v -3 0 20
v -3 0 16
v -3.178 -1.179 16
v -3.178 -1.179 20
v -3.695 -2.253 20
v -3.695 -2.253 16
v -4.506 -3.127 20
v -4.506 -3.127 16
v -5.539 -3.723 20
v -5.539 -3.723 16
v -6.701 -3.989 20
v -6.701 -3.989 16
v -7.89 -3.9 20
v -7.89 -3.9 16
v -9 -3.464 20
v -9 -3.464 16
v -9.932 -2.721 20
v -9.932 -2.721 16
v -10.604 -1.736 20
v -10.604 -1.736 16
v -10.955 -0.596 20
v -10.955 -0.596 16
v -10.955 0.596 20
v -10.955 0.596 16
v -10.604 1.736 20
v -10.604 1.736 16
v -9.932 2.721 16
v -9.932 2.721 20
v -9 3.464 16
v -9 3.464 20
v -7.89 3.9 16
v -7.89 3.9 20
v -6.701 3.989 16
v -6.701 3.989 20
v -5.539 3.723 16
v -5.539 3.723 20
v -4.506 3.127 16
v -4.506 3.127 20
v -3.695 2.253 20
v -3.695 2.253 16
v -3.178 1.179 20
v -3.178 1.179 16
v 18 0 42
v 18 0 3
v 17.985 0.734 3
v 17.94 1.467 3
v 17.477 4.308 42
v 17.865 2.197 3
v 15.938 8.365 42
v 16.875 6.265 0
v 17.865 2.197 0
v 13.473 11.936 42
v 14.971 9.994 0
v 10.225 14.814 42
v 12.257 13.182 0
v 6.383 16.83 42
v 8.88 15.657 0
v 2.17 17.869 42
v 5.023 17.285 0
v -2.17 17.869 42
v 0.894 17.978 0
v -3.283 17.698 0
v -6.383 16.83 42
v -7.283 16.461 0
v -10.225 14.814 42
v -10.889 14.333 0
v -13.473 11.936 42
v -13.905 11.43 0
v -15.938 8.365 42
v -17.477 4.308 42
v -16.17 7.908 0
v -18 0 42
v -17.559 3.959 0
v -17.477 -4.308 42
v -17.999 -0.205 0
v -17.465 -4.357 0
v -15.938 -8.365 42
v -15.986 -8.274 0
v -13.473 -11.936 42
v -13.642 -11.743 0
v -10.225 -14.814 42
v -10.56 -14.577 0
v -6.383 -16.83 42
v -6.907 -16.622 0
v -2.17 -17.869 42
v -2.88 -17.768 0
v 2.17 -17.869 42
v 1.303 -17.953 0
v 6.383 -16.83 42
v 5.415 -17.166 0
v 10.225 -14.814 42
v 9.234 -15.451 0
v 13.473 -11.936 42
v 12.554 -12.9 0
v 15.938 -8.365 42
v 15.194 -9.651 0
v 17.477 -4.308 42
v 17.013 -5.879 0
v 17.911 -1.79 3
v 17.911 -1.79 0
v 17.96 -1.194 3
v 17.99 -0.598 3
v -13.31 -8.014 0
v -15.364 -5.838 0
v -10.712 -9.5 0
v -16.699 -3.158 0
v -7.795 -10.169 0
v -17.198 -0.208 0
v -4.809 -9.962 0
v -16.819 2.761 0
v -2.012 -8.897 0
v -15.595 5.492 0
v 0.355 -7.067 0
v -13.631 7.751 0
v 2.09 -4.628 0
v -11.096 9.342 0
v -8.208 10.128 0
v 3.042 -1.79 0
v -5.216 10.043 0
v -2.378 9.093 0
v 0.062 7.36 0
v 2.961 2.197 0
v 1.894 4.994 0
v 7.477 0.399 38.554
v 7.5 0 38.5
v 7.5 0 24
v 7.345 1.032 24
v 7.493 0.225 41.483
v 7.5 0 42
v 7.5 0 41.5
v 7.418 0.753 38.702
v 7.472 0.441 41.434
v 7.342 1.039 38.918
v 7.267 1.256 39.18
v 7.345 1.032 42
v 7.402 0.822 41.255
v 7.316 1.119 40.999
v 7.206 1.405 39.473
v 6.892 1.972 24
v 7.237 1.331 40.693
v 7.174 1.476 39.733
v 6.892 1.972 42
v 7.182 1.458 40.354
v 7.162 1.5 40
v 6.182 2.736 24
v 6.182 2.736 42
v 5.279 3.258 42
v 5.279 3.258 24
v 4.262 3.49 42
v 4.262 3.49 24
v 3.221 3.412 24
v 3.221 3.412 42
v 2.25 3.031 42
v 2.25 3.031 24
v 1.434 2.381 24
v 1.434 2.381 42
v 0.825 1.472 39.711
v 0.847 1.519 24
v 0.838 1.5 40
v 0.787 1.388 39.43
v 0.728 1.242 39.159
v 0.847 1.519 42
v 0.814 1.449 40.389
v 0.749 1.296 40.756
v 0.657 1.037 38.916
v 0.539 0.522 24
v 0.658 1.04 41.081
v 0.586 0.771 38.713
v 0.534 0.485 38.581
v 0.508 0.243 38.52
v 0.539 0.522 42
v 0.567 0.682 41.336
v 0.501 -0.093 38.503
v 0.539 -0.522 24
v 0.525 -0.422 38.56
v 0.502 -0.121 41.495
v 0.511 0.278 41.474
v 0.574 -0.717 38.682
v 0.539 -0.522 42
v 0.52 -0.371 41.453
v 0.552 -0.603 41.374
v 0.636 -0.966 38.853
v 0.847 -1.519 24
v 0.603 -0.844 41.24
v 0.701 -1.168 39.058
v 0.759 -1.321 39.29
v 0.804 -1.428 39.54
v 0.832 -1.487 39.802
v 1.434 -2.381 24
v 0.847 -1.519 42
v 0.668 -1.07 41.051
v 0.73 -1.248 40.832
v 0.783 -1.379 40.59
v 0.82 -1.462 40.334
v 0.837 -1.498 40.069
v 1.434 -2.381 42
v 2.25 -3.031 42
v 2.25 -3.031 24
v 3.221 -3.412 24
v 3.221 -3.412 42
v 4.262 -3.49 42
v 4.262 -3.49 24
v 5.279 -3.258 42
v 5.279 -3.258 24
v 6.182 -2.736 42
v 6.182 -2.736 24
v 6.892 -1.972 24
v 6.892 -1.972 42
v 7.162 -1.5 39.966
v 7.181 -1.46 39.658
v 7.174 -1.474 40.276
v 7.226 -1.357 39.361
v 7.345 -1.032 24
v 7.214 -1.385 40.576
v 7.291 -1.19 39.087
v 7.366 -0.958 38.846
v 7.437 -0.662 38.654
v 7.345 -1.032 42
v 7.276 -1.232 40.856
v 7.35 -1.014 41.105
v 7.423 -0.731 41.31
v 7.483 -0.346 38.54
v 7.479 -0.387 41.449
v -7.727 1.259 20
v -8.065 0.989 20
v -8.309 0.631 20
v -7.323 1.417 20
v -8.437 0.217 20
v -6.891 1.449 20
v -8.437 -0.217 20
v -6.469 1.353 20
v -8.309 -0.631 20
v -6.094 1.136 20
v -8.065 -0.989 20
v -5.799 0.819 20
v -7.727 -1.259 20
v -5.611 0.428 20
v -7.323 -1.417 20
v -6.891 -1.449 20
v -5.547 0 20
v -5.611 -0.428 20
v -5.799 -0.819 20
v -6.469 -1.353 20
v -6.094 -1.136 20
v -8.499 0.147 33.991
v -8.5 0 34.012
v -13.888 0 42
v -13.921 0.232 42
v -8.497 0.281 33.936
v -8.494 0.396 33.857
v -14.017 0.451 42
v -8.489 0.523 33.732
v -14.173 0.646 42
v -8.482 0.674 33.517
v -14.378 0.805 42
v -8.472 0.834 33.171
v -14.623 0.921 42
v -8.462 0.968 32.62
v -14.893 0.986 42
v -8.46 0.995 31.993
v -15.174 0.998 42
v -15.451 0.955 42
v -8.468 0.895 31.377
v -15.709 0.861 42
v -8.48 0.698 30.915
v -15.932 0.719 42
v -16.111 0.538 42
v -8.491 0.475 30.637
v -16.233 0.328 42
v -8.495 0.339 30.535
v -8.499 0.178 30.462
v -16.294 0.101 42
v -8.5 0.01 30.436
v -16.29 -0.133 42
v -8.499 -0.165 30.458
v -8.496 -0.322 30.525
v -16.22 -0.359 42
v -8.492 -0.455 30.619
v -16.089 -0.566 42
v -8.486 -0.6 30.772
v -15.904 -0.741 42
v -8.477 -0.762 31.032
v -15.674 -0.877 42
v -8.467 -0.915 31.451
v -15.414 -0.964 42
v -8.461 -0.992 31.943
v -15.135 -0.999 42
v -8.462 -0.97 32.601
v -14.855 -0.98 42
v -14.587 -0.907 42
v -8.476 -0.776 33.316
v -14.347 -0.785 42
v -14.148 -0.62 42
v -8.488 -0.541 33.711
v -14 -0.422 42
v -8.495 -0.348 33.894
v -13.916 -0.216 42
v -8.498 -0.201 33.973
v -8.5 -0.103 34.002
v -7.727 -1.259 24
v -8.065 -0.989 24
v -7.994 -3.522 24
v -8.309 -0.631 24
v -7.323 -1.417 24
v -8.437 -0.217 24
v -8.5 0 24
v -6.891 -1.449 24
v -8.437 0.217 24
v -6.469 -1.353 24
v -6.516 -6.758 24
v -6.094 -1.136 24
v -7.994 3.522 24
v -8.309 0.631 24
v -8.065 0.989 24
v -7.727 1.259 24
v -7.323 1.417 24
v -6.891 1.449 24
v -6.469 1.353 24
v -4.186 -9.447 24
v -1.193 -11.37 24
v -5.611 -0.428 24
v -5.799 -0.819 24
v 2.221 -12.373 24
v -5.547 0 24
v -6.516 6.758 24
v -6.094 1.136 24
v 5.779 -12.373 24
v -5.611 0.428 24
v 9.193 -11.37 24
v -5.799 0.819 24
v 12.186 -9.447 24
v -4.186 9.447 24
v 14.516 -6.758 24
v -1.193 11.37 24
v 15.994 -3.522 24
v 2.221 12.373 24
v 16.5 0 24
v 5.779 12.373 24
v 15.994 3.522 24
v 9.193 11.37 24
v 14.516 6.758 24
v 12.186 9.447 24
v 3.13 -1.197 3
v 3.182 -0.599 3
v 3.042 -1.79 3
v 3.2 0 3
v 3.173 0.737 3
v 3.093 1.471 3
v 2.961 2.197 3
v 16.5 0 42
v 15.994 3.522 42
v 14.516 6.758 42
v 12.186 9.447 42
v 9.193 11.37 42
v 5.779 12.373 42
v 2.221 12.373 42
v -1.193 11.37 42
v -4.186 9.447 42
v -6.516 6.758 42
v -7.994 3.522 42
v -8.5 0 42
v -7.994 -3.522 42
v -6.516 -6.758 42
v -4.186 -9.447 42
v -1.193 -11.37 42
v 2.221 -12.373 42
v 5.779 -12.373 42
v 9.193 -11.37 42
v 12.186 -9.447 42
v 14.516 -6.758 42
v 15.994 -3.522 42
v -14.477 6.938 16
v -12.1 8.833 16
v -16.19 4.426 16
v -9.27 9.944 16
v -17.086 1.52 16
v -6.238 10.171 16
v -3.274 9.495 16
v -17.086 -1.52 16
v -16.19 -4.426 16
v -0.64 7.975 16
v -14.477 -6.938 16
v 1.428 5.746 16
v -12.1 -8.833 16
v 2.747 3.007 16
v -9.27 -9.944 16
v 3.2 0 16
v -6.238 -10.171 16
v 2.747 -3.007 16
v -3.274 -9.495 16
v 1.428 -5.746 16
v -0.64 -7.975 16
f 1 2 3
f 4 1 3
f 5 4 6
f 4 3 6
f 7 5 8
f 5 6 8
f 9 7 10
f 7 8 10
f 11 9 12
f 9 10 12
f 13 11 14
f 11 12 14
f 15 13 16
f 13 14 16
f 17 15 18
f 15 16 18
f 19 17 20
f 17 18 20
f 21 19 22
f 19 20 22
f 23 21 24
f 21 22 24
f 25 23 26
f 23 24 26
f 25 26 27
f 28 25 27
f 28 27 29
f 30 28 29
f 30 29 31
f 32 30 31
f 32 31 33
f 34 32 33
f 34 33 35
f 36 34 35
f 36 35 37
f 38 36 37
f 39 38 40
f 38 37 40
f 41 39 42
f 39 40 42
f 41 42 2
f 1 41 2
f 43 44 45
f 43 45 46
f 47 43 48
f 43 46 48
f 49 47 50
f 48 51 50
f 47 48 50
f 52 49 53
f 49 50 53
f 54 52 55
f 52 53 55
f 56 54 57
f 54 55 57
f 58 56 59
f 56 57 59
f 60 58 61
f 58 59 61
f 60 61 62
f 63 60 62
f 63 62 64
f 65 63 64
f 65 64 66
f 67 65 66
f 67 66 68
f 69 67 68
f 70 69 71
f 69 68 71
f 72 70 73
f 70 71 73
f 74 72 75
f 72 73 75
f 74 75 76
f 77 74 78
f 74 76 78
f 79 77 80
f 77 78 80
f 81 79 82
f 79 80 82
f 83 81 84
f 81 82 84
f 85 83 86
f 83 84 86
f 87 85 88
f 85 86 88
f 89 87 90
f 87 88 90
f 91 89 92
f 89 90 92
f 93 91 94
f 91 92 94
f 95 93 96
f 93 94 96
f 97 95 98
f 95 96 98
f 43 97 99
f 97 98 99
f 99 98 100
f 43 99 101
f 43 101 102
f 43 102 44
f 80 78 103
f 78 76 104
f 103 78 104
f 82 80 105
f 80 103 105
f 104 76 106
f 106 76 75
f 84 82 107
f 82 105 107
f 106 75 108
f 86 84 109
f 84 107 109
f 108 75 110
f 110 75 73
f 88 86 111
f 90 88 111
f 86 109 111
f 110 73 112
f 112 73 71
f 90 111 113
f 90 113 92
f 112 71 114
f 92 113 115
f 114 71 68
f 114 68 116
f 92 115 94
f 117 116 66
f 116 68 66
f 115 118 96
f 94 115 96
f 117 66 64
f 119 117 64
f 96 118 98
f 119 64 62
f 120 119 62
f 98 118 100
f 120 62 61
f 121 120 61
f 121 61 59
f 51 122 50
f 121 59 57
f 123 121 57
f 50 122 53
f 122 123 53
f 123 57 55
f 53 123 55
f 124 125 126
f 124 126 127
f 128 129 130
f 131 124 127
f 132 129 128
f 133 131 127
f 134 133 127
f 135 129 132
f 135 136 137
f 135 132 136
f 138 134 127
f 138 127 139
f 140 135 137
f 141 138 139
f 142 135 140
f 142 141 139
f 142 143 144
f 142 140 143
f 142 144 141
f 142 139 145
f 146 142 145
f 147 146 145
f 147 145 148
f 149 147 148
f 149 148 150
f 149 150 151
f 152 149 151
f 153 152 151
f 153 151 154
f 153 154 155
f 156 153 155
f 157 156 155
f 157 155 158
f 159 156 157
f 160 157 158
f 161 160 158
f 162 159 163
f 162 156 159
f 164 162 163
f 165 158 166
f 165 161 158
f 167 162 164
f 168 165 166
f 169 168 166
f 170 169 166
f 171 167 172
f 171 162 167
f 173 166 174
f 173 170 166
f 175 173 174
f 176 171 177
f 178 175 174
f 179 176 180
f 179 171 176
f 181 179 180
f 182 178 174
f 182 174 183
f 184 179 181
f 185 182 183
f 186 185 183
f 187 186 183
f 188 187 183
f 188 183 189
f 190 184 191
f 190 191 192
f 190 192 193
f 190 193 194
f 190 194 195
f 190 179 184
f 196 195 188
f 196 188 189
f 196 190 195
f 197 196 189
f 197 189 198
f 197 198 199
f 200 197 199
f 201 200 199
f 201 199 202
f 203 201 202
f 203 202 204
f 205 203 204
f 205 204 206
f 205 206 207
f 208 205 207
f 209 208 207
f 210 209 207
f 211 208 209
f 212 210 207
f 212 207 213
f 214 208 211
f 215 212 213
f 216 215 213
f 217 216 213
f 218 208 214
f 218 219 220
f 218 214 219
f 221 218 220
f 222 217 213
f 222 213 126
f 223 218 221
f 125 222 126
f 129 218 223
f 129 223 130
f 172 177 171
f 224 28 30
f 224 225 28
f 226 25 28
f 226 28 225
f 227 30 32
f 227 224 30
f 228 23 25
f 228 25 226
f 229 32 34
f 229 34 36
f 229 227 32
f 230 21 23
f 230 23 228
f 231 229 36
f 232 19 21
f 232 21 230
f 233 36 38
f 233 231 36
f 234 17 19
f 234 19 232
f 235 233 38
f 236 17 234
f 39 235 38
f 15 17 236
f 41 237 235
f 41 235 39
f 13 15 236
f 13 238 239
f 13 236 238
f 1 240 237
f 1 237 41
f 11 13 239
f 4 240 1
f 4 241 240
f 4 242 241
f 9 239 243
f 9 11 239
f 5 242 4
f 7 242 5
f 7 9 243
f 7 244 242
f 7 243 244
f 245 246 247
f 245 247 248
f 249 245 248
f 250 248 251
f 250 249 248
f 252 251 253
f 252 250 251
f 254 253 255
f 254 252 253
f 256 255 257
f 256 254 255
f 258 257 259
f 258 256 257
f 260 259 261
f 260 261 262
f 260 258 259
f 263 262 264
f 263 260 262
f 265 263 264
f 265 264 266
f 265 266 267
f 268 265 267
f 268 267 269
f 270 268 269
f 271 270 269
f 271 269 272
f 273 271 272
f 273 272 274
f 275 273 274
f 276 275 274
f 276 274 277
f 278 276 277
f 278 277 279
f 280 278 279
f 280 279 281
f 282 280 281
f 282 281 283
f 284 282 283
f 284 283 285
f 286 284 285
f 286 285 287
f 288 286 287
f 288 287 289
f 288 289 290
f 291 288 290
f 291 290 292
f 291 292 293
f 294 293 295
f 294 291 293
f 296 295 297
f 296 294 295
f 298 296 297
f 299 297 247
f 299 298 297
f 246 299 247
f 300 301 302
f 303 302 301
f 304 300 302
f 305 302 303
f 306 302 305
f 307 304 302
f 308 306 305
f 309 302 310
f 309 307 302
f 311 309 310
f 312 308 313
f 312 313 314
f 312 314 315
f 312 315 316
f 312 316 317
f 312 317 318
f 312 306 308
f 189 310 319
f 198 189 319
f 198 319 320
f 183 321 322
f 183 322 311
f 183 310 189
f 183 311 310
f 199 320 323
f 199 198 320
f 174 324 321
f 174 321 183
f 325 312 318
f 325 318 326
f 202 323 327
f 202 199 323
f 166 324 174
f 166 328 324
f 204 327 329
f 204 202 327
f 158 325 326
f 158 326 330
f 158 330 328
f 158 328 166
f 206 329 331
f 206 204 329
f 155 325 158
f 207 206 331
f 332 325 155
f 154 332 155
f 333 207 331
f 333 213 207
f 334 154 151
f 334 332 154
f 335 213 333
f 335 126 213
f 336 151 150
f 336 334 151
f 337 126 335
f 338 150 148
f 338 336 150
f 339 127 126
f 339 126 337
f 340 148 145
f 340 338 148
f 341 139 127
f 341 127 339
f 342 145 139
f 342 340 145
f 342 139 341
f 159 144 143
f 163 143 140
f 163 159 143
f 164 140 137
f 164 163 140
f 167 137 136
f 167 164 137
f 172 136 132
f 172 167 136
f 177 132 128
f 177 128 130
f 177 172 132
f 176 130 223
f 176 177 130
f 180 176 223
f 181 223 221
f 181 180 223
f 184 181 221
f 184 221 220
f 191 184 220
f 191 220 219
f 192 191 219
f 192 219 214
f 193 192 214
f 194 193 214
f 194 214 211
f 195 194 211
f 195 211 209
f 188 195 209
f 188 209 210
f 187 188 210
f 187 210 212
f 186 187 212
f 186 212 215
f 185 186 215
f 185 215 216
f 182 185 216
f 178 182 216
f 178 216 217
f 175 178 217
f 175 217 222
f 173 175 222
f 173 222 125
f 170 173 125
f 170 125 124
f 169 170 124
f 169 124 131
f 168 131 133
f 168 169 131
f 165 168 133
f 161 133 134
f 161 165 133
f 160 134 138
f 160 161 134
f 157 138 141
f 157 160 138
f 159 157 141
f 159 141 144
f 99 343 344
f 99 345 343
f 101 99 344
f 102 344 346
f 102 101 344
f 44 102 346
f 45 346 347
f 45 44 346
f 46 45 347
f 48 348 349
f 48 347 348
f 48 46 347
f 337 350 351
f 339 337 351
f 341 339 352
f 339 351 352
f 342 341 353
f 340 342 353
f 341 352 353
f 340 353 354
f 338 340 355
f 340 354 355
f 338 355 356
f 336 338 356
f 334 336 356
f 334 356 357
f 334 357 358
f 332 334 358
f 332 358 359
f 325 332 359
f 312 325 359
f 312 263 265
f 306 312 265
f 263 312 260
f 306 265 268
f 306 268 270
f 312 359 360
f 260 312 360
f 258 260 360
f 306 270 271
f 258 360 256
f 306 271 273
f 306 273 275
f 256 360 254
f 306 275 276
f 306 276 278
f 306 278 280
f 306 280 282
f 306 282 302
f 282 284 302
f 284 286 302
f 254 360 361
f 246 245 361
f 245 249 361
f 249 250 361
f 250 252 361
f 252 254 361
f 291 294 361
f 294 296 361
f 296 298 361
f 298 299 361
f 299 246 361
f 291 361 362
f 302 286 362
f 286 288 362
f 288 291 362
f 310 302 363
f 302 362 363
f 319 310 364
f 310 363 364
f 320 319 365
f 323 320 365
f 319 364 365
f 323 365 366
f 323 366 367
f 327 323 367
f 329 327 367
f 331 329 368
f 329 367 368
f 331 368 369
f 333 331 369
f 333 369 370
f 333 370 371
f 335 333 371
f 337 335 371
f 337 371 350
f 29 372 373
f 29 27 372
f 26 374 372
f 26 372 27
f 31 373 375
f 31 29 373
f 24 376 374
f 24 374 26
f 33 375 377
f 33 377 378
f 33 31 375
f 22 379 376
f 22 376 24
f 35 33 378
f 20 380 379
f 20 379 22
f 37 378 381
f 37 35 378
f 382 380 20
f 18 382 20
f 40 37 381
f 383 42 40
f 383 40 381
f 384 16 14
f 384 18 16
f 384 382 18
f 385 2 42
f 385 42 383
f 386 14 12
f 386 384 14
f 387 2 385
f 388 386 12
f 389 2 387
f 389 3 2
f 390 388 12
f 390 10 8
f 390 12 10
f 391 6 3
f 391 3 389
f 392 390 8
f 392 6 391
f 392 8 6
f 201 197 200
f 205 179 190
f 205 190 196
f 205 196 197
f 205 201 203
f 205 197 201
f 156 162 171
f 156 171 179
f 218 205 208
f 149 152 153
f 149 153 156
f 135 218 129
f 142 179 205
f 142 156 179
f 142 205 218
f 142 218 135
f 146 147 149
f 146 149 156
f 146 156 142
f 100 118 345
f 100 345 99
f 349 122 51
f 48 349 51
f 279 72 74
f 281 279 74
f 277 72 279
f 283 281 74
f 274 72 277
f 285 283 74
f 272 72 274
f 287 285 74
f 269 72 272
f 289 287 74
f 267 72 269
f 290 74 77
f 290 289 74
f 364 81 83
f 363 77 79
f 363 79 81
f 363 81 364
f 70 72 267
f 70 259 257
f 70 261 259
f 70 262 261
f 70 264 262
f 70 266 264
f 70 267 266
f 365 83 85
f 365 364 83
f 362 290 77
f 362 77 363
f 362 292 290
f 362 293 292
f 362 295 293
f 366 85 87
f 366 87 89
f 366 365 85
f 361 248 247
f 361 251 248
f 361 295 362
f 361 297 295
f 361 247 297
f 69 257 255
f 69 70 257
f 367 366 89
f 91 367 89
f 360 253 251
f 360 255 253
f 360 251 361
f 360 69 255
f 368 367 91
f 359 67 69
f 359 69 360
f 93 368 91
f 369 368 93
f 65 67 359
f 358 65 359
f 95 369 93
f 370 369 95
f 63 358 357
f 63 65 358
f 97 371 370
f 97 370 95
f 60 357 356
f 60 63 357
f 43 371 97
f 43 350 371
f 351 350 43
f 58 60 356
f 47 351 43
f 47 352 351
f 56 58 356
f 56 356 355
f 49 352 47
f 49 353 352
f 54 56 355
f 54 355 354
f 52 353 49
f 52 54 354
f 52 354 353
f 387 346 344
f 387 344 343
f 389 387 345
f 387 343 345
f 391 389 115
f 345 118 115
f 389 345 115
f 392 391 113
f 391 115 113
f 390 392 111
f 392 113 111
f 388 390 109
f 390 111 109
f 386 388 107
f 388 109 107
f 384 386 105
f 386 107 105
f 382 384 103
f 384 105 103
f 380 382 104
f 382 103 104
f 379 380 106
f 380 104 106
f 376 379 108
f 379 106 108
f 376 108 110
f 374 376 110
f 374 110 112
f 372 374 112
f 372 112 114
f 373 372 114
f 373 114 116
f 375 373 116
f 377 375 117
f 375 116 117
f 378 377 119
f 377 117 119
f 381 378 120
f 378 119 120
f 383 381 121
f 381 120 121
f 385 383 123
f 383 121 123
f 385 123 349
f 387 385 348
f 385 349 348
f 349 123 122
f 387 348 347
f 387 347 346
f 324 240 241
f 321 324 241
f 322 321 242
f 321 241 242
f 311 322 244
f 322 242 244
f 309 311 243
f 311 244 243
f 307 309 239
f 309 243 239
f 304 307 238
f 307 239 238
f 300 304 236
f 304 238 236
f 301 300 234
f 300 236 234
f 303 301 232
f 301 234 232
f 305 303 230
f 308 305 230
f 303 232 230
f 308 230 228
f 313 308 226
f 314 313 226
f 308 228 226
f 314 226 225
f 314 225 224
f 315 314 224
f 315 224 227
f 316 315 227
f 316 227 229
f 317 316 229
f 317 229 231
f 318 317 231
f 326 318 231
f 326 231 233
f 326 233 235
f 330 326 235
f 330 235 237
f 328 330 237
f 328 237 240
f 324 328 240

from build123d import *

# Parameters (mm, degrees)
CYLINDER_R        = 18
CYLINDER_DEPTH    = 42
SKETCH_R          = 10.2
POCKET_DEPTH      = 16
SKETCH002_R       = 12.5
SKETCH002_R_2     = 3.5
POCKET001_DEPTH   = 18
SKETCH001_R       = 4
POCKET002_DEPTH   = 4
SKETCH003_R       = 1.453406
POCKET003_DEPTH   = 5
CYLINDER001_R     = 1
CYLINDER001_DEPTH = 33
CYLINDER002_R     = 1.5
CYLINDER002_DEPTH = 10
SKETCH004_W       = 3.987101
SKETCH004_H       = 23.792822
POCKET004_DEPTH   = 3


with BuildPart() as part:
    # Cylinder → Cylinder (join)
    with BuildSketch(Plane.XY):
        Circle(CYLINDER_R)
    extrude(amount=CYLINDER_DEPTH)

    # Sketch (on Face2 of Cylinder) → Pocket (cut)
    with BuildSketch(Plane(origin=(0, 0, 0), x_dir=(1, 0, 0), z_dir=(0, 0, -1))):
        with Locations((-7, 0)):
            Circle(SKETCH_R)
    extrude(amount=-POCKET_DEPTH, mode=Mode.SUBTRACT)

    # Sketch002 (on DatumPlane) → Pocket001 (cut)
    with BuildSketch(Plane.XY.offset(42)):
        with Locations((4, 0)):
            Circle(SKETCH002_R)
        with Locations((4, 0)):
            Circle(SKETCH002_R_2, mode=Mode.SUBTRACT)
    extrude(amount=-POCKET001_DEPTH, mode=Mode.SUBTRACT)

    # Sketch001 (on DatumPlane) → Pocket002 (cut)
    with BuildSketch(Plane(origin=(0, 0, 16), x_dir=(1, 0, 0), z_dir=(0, 0, -1))):
        with Locations((-7, 0)):
            Circle(SKETCH001_R)
    extrude(amount=-POCKET002_DEPTH, mode=Mode.SUBTRACT)

    # Sketch003 (on DatumPlane) → Pocket003 (cut)
    with BuildSketch(Plane(origin=(0, 0, 20), x_dir=(1, 0, 0), z_dir=(0, 0, -1))):
        with Locations((-7, 0)):
            Circle(SKETCH003_R)
    extrude(amount=-POCKET003_DEPTH, mode=Mode.SUBTRACT)

    # Cylinder001 → Cylinder001 (cut)
    with BuildSketch(Plane(origin=(-7, 0, 30), x_dir=(0.829038, 0, 0.559193), z_dir=(-0.559193, 0, 0.829038))):
        Circle(CYLINDER001_R)
    extrude(amount=CYLINDER001_DEPTH, mode=Mode.SUBTRACT)

    # Cylinder002 → Cylinder002 (cut)
    with BuildSketch(Plane(origin=(0, 0, 40), x_dir=(0, 1, 0), z_dir=(1, 0, 0))):
        Circle(CYLINDER002_R)
    extrude(amount=CYLINDER002_DEPTH, mode=Mode.SUBTRACT)

    # Sketch004 (on Face2 of Cylinder002) → Pocket004 (cut)
    with BuildSketch(Plane.YX):
        with Locations((0.203517, 6.997041)):
            Rectangle(SKETCH004_W, SKETCH004_H)
    extrude(amount=-POCKET004_DEPTH, mode=Mode.SUBTRACT)


solid = part.part
